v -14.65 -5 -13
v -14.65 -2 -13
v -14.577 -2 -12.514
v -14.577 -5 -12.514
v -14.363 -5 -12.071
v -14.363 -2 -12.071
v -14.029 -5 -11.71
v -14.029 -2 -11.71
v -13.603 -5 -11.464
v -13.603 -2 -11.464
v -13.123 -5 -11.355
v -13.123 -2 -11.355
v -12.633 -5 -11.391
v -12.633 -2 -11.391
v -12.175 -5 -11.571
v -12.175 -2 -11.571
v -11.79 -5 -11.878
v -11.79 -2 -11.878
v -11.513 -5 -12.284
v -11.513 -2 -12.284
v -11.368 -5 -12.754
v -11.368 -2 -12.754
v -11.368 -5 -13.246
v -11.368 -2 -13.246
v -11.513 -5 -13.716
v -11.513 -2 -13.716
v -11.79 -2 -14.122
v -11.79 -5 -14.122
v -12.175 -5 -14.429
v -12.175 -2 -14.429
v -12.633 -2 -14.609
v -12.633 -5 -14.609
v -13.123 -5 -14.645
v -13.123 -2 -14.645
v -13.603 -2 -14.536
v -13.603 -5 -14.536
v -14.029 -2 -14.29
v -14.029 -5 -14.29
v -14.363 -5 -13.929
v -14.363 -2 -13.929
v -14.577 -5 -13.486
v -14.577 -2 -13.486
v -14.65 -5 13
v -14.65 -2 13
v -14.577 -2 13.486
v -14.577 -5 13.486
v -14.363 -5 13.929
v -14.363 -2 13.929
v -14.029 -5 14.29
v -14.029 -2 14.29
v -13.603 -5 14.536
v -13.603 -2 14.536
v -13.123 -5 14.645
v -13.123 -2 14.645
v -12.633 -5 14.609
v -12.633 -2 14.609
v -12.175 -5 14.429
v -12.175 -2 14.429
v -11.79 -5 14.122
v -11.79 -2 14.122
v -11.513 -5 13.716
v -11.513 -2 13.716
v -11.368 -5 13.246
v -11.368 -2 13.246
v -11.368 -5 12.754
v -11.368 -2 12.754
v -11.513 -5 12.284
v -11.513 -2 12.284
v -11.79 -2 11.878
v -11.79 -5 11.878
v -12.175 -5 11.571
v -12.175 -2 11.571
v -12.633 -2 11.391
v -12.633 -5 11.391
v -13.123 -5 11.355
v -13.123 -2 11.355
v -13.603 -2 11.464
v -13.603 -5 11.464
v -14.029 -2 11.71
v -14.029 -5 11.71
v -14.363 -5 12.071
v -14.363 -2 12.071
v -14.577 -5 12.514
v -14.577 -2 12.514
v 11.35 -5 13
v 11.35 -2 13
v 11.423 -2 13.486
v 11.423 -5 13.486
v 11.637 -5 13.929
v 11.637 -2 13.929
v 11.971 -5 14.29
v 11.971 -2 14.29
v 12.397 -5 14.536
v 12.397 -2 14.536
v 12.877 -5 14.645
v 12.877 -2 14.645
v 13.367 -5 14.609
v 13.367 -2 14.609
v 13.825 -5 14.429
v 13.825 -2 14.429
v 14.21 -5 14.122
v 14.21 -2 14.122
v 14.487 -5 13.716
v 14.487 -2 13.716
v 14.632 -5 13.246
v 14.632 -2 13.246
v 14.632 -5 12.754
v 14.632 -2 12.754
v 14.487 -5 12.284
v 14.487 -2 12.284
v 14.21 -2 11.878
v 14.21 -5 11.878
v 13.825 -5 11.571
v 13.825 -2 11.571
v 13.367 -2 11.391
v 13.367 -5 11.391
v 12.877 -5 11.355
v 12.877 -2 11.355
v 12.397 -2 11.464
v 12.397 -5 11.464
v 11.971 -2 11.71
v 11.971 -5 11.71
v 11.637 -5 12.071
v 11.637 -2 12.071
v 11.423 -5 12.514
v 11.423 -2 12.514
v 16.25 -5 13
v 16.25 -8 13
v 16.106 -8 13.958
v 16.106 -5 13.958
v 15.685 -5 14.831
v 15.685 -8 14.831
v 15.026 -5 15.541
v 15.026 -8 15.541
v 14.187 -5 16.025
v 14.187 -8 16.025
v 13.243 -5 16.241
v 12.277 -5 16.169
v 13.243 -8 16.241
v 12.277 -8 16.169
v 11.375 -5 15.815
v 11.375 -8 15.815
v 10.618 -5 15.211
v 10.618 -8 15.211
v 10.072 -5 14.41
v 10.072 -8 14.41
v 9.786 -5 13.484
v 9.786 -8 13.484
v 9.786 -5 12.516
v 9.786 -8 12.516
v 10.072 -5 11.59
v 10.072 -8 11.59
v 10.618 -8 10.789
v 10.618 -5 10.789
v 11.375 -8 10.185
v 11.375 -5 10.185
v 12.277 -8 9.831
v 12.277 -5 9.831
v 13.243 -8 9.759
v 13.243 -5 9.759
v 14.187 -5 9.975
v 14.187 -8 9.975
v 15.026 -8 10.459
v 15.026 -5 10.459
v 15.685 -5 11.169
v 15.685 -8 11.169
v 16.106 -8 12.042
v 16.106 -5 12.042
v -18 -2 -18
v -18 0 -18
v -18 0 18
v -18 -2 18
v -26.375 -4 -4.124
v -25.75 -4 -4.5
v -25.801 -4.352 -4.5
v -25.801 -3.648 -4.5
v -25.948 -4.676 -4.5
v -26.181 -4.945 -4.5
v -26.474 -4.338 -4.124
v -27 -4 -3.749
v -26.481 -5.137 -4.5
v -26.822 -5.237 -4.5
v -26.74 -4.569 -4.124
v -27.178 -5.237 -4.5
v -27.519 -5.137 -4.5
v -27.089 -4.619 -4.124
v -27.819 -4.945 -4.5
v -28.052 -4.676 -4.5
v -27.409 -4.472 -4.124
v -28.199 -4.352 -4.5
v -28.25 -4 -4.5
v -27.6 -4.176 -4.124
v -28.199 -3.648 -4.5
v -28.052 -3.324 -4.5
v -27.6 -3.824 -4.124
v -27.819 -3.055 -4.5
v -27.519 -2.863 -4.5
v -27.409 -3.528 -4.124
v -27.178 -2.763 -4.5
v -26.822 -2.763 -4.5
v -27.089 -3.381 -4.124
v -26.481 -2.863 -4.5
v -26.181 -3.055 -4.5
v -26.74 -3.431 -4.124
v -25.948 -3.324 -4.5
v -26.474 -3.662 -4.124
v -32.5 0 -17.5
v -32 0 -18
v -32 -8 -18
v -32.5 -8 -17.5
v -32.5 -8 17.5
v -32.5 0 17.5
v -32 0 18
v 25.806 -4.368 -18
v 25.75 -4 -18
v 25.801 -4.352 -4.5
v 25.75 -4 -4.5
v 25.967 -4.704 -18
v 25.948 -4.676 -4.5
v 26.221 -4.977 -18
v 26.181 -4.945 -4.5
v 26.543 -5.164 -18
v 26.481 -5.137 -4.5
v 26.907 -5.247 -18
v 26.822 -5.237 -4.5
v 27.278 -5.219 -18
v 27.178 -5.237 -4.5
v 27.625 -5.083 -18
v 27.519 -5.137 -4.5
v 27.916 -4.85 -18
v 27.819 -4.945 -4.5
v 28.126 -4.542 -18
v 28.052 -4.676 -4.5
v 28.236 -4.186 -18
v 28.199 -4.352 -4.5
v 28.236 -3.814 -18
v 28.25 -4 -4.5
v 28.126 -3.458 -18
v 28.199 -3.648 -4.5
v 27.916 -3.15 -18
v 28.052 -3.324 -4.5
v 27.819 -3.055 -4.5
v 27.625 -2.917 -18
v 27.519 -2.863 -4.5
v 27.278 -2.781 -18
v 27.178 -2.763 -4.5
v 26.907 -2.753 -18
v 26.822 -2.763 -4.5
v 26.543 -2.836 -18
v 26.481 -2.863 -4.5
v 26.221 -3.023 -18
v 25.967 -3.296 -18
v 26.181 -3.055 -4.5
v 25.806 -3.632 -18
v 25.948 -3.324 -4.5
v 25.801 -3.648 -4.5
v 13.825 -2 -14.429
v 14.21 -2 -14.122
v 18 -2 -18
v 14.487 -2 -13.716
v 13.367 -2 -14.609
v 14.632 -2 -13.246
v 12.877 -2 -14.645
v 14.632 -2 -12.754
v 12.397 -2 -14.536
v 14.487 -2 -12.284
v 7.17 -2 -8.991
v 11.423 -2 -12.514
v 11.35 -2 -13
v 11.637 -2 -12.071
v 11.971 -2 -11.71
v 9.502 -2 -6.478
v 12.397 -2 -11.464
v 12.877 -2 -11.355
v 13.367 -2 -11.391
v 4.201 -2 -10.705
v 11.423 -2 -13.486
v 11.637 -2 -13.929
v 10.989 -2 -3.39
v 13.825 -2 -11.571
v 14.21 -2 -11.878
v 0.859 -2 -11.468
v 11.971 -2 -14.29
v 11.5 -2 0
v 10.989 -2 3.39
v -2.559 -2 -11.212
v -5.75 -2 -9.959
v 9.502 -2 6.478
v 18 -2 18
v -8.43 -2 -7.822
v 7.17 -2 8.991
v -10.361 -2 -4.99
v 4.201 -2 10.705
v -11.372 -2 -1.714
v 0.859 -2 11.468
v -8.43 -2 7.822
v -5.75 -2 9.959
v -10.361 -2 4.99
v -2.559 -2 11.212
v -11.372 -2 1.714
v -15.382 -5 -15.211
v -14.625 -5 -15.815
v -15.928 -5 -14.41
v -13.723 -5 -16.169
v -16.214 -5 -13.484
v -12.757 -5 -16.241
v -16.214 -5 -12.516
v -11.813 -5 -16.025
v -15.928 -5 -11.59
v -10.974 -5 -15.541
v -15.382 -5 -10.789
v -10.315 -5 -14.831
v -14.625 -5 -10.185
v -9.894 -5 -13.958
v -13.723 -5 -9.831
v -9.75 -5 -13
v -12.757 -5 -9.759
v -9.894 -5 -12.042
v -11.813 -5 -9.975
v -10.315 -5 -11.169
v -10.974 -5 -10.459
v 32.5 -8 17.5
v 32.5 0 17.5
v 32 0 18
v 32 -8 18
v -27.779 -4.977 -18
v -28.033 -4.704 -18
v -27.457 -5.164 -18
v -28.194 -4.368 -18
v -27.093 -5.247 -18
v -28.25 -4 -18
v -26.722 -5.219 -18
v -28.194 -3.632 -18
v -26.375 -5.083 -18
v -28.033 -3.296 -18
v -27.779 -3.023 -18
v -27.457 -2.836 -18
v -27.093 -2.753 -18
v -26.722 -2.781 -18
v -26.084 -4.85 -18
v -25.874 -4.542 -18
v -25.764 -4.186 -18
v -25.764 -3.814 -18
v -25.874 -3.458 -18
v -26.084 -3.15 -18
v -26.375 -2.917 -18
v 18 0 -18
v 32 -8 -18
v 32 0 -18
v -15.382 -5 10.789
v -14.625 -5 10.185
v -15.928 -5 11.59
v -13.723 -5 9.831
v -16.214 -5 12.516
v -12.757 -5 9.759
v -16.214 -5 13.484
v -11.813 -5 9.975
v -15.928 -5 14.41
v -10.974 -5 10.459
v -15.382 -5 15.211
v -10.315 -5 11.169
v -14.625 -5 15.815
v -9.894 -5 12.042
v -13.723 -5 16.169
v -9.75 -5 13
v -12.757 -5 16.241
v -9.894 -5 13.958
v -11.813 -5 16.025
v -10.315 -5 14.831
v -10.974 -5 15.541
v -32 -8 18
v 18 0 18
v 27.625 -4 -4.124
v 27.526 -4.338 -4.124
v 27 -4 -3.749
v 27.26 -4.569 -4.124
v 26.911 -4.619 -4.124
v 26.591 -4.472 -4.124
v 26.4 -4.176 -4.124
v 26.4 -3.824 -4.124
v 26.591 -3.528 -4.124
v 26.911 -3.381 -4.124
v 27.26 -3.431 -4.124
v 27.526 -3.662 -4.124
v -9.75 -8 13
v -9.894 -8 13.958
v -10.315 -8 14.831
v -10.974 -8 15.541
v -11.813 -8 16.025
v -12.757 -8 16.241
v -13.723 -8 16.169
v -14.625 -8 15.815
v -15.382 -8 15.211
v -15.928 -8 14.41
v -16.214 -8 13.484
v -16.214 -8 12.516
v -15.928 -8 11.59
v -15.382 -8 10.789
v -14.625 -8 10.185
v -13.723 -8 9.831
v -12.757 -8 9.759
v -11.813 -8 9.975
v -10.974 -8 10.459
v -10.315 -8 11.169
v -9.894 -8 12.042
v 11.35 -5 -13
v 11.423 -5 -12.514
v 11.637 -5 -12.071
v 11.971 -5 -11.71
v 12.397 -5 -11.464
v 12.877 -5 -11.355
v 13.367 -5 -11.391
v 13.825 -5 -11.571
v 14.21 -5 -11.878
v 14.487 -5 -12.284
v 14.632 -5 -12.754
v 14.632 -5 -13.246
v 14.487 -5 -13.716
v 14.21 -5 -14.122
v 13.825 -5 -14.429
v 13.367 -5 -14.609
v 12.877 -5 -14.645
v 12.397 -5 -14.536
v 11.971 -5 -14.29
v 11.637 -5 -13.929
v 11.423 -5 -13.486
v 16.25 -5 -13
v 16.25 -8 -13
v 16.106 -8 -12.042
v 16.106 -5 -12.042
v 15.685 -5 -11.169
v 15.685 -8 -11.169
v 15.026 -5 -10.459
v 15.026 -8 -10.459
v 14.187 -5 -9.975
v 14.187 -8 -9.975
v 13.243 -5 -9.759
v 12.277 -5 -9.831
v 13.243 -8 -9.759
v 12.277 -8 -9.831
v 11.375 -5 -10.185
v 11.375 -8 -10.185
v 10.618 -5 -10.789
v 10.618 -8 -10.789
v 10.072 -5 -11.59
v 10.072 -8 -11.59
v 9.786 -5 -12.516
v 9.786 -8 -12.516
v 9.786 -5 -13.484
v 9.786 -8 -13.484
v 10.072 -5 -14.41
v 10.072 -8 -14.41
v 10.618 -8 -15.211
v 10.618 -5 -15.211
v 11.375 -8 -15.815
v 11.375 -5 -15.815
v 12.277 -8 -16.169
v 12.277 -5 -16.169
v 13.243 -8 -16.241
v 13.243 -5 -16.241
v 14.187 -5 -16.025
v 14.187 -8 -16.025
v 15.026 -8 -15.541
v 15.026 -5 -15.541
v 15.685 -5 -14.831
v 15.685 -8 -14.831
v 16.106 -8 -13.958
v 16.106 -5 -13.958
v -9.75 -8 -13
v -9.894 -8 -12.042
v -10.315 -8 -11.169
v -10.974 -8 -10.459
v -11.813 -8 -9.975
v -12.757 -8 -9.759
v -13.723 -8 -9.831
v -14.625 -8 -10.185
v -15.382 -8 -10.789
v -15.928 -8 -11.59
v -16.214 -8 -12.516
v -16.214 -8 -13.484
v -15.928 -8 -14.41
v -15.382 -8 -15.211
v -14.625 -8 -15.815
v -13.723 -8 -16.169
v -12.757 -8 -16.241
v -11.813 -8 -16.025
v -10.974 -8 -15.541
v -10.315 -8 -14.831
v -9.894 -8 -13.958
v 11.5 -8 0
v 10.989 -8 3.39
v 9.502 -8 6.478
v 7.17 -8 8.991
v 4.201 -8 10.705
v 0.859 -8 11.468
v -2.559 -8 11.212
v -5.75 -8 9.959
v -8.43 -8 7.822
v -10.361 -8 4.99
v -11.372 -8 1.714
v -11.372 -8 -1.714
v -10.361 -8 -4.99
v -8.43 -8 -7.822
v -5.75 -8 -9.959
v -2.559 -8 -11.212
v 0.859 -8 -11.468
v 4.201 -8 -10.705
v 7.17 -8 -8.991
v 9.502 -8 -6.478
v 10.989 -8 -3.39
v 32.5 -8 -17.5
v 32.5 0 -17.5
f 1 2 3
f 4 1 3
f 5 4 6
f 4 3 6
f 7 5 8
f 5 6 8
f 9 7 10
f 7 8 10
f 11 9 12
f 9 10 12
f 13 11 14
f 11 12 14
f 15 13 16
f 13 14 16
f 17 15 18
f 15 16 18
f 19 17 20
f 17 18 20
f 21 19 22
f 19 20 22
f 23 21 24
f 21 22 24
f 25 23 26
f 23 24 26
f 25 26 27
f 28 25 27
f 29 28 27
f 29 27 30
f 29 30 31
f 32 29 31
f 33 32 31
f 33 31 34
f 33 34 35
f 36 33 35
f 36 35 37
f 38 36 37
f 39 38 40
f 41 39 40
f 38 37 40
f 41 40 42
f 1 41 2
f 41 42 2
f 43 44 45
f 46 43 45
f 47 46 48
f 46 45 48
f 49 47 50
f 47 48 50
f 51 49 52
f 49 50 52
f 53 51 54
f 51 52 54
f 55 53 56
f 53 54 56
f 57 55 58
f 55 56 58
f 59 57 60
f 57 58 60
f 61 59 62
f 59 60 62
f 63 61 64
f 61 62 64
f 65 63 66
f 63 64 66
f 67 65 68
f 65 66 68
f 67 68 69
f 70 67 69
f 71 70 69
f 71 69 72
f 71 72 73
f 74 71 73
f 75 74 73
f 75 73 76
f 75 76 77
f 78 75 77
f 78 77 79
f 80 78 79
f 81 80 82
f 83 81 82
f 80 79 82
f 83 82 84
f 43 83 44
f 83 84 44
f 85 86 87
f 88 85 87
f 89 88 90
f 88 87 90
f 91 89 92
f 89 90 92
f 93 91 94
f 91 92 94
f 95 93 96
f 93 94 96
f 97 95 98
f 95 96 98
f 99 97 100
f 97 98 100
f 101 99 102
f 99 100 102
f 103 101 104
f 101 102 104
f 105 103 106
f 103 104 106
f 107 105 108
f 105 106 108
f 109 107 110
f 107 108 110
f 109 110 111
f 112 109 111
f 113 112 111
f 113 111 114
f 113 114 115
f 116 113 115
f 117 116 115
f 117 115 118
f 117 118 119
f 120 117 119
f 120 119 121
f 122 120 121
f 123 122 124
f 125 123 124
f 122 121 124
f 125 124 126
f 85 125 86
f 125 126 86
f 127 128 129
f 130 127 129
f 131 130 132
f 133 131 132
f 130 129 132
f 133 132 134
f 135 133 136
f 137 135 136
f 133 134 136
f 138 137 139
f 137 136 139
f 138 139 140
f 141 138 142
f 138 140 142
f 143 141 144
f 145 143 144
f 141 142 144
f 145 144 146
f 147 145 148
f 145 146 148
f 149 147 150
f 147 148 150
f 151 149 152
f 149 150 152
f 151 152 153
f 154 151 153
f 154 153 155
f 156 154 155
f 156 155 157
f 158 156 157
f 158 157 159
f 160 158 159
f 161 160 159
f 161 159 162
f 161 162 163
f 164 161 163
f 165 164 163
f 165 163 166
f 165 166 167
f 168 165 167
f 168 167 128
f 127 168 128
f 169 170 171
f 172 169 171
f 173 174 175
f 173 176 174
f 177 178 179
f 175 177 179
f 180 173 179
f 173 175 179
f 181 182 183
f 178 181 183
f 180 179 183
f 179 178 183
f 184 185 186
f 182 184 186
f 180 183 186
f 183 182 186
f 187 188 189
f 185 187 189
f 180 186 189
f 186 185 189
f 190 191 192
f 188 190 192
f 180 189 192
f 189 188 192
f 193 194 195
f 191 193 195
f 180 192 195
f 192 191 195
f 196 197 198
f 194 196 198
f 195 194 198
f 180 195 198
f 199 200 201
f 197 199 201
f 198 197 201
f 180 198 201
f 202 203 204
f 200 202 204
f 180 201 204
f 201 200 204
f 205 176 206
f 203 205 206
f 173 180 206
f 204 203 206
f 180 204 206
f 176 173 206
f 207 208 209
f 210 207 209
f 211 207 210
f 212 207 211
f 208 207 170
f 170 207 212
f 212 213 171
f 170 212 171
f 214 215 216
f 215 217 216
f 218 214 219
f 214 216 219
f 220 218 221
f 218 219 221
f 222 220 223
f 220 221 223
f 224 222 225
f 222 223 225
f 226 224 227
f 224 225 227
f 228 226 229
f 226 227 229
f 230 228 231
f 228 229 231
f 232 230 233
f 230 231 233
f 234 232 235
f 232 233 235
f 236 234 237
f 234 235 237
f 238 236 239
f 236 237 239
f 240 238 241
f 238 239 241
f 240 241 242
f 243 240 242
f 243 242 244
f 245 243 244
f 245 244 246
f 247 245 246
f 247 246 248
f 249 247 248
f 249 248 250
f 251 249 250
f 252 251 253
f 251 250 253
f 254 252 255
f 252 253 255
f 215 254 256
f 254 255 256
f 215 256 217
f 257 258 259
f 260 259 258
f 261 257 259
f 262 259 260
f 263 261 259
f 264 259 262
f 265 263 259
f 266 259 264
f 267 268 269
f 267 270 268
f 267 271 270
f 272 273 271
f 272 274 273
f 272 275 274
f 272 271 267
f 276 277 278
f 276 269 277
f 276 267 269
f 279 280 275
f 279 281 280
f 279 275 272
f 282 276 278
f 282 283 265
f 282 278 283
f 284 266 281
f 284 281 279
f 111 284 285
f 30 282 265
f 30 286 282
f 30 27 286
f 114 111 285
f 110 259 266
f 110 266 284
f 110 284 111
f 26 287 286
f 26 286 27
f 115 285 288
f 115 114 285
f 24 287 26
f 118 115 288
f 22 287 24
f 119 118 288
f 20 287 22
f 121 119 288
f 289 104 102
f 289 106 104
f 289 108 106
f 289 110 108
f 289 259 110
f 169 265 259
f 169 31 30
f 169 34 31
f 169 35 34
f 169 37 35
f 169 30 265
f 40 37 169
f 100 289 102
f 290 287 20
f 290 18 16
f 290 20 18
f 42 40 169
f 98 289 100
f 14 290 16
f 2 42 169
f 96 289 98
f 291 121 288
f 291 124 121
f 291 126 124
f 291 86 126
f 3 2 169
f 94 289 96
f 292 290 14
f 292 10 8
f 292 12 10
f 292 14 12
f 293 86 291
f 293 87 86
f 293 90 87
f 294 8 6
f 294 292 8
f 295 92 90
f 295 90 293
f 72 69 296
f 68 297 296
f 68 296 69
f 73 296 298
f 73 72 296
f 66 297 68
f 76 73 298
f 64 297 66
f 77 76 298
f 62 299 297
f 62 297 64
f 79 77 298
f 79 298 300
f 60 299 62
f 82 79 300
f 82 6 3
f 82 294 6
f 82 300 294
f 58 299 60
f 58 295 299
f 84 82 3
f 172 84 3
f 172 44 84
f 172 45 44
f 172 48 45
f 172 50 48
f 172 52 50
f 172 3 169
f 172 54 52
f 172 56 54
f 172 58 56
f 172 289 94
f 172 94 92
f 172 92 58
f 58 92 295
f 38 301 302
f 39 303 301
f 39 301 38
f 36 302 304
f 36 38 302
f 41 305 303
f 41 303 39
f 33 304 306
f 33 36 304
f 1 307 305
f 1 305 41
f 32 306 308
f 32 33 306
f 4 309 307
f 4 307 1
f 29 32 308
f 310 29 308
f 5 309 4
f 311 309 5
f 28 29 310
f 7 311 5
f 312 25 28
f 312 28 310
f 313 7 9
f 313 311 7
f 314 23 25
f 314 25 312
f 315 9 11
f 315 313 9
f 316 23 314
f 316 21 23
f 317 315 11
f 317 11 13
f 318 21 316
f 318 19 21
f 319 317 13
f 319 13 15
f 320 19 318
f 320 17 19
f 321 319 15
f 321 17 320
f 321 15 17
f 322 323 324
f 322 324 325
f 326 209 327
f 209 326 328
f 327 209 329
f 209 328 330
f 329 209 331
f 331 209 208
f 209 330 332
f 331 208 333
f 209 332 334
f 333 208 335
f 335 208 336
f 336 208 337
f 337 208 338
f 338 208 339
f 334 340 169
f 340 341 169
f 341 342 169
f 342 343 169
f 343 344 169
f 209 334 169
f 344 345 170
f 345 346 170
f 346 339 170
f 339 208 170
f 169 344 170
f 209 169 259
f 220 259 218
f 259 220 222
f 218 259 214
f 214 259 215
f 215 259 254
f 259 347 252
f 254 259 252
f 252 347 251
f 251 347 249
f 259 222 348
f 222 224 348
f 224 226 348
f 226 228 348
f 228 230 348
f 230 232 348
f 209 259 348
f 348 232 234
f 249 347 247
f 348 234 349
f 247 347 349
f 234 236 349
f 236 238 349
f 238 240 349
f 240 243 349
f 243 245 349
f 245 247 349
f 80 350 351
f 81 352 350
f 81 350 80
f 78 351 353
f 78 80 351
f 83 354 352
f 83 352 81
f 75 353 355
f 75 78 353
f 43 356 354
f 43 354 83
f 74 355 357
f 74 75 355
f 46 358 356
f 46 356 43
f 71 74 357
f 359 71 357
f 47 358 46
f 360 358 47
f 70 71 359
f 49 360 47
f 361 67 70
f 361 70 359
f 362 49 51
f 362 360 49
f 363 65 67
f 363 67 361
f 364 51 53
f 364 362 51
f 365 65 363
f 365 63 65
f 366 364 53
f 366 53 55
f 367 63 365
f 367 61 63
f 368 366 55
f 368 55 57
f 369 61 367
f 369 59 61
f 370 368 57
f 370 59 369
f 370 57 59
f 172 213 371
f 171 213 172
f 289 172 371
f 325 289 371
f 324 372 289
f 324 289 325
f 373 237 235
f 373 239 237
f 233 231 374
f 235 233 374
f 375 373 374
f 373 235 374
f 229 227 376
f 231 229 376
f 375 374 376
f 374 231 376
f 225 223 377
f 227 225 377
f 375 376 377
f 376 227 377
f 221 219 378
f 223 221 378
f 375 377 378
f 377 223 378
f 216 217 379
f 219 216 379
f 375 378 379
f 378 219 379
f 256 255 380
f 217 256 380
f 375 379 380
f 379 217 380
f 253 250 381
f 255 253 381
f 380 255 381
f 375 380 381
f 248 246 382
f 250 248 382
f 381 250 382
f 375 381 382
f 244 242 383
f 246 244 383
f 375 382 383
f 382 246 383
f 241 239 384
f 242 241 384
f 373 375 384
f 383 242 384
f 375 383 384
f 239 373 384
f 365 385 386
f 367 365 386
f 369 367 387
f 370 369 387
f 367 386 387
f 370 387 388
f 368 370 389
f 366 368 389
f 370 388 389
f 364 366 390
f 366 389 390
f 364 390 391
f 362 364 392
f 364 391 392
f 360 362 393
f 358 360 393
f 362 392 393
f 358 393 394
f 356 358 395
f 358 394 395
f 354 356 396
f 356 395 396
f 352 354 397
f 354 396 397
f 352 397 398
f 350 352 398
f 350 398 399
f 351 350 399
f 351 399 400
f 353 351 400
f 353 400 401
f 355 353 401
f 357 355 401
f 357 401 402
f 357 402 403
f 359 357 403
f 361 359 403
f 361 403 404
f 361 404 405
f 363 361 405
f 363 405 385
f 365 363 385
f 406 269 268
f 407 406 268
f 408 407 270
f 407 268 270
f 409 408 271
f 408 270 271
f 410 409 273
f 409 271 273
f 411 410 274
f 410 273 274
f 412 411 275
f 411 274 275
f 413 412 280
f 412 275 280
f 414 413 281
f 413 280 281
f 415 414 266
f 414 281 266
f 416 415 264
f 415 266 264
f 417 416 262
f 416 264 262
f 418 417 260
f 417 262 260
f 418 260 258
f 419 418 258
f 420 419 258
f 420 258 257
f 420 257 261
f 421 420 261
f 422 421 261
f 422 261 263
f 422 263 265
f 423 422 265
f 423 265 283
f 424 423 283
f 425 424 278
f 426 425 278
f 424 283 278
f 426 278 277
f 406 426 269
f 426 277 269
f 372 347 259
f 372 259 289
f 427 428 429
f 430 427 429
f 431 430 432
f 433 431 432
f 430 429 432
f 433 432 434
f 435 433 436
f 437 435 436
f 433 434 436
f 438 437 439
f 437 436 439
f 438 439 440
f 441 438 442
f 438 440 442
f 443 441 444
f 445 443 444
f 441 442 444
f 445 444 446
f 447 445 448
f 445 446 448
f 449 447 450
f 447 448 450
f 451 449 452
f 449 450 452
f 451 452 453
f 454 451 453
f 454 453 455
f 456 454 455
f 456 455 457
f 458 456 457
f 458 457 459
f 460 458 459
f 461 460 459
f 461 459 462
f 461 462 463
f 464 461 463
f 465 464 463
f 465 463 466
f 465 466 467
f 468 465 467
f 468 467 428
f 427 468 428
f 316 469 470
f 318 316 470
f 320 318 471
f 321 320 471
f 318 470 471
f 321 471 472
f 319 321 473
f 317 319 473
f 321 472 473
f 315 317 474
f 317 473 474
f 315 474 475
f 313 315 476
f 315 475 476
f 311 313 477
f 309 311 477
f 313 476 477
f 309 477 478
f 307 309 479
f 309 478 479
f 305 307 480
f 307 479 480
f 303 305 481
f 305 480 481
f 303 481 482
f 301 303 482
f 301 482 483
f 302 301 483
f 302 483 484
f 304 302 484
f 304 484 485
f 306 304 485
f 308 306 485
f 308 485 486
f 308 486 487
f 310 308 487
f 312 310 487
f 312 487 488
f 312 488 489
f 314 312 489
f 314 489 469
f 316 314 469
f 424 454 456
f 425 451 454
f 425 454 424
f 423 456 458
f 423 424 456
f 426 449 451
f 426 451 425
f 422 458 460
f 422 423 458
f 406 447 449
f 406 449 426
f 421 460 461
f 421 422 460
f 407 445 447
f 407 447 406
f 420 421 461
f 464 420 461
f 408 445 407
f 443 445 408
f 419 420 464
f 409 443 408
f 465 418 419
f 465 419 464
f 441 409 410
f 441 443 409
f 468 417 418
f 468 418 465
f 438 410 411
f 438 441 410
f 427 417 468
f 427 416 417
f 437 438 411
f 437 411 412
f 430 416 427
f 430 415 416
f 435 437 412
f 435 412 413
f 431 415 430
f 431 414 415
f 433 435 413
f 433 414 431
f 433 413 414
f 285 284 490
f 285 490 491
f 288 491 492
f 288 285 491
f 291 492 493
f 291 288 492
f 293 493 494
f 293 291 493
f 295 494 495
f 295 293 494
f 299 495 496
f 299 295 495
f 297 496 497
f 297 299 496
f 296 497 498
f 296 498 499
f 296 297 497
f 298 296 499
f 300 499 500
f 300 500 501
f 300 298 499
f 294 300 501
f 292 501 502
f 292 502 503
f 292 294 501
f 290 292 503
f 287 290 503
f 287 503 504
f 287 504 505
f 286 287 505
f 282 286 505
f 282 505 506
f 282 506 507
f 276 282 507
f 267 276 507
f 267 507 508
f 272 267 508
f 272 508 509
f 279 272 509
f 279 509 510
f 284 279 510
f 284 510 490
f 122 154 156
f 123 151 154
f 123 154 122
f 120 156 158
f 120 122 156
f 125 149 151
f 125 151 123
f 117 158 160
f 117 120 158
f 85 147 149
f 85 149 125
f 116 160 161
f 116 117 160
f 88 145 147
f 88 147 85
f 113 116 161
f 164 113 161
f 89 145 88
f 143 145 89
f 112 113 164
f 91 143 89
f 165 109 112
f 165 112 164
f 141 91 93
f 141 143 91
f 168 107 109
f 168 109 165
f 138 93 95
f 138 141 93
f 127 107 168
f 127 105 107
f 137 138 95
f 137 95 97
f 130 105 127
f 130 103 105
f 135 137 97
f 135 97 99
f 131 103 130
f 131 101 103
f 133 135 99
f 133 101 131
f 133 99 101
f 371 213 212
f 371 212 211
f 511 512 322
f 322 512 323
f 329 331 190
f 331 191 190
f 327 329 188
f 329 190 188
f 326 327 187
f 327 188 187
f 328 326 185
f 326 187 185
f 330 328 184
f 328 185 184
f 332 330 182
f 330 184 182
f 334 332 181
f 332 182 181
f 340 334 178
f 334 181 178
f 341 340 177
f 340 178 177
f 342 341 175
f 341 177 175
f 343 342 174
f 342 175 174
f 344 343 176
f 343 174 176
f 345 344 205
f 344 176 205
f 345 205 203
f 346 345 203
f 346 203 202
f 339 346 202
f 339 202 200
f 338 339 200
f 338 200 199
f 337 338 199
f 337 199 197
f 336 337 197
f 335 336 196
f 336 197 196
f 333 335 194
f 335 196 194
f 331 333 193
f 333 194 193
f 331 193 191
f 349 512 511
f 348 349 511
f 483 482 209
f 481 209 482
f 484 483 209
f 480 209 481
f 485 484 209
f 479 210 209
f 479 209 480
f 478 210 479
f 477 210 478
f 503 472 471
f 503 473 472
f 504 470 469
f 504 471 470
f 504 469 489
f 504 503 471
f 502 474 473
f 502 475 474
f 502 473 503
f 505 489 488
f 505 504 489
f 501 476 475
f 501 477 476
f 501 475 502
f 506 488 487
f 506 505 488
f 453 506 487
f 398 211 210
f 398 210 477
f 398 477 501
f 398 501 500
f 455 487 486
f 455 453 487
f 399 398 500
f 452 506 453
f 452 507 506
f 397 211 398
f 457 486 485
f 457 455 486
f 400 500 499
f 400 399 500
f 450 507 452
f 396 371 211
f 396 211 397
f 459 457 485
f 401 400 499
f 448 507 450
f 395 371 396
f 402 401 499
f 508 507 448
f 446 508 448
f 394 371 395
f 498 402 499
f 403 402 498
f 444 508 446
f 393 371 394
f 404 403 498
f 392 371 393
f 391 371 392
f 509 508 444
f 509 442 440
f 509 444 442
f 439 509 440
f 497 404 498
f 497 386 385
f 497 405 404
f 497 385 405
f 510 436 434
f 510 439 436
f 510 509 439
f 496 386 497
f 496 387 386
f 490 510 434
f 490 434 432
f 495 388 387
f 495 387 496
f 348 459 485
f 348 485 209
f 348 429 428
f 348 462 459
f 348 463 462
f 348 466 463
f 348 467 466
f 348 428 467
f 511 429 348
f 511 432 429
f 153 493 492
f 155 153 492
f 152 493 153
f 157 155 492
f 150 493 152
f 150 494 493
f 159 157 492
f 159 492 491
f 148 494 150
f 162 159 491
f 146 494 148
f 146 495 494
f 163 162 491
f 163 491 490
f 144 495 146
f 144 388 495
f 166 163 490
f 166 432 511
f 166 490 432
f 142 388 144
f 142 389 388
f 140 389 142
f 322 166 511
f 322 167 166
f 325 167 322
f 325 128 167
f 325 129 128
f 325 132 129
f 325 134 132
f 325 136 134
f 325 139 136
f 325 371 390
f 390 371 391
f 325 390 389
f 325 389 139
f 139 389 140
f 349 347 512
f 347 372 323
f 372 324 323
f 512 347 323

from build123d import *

# Parameters (mm, degrees)
F0_W           = 65
F0_H           = 36
F0_R           = 11.5
F1_DEPTH       = 8
F3_D           = 3.3
F3_CBORE_D     = 6.5
F3_CBORE_DEPTH = 3
F4_SIZE        = 0.5
F6_D           = 2.5
F6_DEPTH       = 13.5
F6_TIP         = 0.7510757738
F7_W           = 36
F7_H           = 36
F7_R           = 1.65
F7_R_2         = 11.5
F8_DEPTH       = 2


with BuildPart() as f1:
    # F0 (on Front) → F1 (new body)
    with BuildSketch(Plane.XZ):
        Rectangle(F0_W, F0_H)
        Circle(F0_R, mode=Mode.SUBTRACT)
    extrude(amount=F1_DEPTH)

    # F3 (through all)
    with Locations(Plane.XZ.offset(8)):
        with Locations((13, 13), (13, -13), (-13, -13), (-13, 13)):
            CounterBoreHole(F3_D / 2, F3_CBORE_D / 2, F3_CBORE_DEPTH)

    # F4
    f4_edges = [f1.edges().sort_by_distance(p)[0] for p in [
        (-32.5, -4, 18),
        (32.5, -4, 18),
        (32.5, -4, -18),
        (-32.5, -4, -18),
    ]]
    chamfer(f4_edges, length=F4_SIZE)

    # F6
    with Locations(Plane(origin=(0, 0, -18), x_dir=(1, 0, 0), z_dir=(0, 0, -1))):
        with Locations((27, 4), (-27, 4)):
            Hole(F6_D / 2, depth=F6_DEPTH)
            with Locations((0, 0, -(F6_DEPTH + F6_TIP / 2))):  # 118° drill point
                Cone(0, F6_D / 2, F6_TIP, mode=Mode.SUBTRACT)

    # F7 (on face) → F8 (cut)
    with BuildSketch(Plane(origin=(0, 0, 0), x_dir=(-1, 0, 0), z_dir=(0, 1, 0))):
        Rectangle(F7_W, F7_H)
        with Locations((-13, -13)):
            Circle(F7_R, mode=Mode.SUBTRACT)
        with Locations((13, -13)):
            Circle(F7_R, mode=Mode.SUBTRACT)
        with Locations((-13, 13)):
            Circle(F7_R, mode=Mode.SUBTRACT)
        Circle(F7_R_2, mode=Mode.SUBTRACT)
        with Locations((13, 13)):
            Circle(F7_R, mode=Mode.SUBTRACT)
    extrude(amount=-F8_DEPTH, mode=Mode.SUBTRACT)


solid = f1.part
